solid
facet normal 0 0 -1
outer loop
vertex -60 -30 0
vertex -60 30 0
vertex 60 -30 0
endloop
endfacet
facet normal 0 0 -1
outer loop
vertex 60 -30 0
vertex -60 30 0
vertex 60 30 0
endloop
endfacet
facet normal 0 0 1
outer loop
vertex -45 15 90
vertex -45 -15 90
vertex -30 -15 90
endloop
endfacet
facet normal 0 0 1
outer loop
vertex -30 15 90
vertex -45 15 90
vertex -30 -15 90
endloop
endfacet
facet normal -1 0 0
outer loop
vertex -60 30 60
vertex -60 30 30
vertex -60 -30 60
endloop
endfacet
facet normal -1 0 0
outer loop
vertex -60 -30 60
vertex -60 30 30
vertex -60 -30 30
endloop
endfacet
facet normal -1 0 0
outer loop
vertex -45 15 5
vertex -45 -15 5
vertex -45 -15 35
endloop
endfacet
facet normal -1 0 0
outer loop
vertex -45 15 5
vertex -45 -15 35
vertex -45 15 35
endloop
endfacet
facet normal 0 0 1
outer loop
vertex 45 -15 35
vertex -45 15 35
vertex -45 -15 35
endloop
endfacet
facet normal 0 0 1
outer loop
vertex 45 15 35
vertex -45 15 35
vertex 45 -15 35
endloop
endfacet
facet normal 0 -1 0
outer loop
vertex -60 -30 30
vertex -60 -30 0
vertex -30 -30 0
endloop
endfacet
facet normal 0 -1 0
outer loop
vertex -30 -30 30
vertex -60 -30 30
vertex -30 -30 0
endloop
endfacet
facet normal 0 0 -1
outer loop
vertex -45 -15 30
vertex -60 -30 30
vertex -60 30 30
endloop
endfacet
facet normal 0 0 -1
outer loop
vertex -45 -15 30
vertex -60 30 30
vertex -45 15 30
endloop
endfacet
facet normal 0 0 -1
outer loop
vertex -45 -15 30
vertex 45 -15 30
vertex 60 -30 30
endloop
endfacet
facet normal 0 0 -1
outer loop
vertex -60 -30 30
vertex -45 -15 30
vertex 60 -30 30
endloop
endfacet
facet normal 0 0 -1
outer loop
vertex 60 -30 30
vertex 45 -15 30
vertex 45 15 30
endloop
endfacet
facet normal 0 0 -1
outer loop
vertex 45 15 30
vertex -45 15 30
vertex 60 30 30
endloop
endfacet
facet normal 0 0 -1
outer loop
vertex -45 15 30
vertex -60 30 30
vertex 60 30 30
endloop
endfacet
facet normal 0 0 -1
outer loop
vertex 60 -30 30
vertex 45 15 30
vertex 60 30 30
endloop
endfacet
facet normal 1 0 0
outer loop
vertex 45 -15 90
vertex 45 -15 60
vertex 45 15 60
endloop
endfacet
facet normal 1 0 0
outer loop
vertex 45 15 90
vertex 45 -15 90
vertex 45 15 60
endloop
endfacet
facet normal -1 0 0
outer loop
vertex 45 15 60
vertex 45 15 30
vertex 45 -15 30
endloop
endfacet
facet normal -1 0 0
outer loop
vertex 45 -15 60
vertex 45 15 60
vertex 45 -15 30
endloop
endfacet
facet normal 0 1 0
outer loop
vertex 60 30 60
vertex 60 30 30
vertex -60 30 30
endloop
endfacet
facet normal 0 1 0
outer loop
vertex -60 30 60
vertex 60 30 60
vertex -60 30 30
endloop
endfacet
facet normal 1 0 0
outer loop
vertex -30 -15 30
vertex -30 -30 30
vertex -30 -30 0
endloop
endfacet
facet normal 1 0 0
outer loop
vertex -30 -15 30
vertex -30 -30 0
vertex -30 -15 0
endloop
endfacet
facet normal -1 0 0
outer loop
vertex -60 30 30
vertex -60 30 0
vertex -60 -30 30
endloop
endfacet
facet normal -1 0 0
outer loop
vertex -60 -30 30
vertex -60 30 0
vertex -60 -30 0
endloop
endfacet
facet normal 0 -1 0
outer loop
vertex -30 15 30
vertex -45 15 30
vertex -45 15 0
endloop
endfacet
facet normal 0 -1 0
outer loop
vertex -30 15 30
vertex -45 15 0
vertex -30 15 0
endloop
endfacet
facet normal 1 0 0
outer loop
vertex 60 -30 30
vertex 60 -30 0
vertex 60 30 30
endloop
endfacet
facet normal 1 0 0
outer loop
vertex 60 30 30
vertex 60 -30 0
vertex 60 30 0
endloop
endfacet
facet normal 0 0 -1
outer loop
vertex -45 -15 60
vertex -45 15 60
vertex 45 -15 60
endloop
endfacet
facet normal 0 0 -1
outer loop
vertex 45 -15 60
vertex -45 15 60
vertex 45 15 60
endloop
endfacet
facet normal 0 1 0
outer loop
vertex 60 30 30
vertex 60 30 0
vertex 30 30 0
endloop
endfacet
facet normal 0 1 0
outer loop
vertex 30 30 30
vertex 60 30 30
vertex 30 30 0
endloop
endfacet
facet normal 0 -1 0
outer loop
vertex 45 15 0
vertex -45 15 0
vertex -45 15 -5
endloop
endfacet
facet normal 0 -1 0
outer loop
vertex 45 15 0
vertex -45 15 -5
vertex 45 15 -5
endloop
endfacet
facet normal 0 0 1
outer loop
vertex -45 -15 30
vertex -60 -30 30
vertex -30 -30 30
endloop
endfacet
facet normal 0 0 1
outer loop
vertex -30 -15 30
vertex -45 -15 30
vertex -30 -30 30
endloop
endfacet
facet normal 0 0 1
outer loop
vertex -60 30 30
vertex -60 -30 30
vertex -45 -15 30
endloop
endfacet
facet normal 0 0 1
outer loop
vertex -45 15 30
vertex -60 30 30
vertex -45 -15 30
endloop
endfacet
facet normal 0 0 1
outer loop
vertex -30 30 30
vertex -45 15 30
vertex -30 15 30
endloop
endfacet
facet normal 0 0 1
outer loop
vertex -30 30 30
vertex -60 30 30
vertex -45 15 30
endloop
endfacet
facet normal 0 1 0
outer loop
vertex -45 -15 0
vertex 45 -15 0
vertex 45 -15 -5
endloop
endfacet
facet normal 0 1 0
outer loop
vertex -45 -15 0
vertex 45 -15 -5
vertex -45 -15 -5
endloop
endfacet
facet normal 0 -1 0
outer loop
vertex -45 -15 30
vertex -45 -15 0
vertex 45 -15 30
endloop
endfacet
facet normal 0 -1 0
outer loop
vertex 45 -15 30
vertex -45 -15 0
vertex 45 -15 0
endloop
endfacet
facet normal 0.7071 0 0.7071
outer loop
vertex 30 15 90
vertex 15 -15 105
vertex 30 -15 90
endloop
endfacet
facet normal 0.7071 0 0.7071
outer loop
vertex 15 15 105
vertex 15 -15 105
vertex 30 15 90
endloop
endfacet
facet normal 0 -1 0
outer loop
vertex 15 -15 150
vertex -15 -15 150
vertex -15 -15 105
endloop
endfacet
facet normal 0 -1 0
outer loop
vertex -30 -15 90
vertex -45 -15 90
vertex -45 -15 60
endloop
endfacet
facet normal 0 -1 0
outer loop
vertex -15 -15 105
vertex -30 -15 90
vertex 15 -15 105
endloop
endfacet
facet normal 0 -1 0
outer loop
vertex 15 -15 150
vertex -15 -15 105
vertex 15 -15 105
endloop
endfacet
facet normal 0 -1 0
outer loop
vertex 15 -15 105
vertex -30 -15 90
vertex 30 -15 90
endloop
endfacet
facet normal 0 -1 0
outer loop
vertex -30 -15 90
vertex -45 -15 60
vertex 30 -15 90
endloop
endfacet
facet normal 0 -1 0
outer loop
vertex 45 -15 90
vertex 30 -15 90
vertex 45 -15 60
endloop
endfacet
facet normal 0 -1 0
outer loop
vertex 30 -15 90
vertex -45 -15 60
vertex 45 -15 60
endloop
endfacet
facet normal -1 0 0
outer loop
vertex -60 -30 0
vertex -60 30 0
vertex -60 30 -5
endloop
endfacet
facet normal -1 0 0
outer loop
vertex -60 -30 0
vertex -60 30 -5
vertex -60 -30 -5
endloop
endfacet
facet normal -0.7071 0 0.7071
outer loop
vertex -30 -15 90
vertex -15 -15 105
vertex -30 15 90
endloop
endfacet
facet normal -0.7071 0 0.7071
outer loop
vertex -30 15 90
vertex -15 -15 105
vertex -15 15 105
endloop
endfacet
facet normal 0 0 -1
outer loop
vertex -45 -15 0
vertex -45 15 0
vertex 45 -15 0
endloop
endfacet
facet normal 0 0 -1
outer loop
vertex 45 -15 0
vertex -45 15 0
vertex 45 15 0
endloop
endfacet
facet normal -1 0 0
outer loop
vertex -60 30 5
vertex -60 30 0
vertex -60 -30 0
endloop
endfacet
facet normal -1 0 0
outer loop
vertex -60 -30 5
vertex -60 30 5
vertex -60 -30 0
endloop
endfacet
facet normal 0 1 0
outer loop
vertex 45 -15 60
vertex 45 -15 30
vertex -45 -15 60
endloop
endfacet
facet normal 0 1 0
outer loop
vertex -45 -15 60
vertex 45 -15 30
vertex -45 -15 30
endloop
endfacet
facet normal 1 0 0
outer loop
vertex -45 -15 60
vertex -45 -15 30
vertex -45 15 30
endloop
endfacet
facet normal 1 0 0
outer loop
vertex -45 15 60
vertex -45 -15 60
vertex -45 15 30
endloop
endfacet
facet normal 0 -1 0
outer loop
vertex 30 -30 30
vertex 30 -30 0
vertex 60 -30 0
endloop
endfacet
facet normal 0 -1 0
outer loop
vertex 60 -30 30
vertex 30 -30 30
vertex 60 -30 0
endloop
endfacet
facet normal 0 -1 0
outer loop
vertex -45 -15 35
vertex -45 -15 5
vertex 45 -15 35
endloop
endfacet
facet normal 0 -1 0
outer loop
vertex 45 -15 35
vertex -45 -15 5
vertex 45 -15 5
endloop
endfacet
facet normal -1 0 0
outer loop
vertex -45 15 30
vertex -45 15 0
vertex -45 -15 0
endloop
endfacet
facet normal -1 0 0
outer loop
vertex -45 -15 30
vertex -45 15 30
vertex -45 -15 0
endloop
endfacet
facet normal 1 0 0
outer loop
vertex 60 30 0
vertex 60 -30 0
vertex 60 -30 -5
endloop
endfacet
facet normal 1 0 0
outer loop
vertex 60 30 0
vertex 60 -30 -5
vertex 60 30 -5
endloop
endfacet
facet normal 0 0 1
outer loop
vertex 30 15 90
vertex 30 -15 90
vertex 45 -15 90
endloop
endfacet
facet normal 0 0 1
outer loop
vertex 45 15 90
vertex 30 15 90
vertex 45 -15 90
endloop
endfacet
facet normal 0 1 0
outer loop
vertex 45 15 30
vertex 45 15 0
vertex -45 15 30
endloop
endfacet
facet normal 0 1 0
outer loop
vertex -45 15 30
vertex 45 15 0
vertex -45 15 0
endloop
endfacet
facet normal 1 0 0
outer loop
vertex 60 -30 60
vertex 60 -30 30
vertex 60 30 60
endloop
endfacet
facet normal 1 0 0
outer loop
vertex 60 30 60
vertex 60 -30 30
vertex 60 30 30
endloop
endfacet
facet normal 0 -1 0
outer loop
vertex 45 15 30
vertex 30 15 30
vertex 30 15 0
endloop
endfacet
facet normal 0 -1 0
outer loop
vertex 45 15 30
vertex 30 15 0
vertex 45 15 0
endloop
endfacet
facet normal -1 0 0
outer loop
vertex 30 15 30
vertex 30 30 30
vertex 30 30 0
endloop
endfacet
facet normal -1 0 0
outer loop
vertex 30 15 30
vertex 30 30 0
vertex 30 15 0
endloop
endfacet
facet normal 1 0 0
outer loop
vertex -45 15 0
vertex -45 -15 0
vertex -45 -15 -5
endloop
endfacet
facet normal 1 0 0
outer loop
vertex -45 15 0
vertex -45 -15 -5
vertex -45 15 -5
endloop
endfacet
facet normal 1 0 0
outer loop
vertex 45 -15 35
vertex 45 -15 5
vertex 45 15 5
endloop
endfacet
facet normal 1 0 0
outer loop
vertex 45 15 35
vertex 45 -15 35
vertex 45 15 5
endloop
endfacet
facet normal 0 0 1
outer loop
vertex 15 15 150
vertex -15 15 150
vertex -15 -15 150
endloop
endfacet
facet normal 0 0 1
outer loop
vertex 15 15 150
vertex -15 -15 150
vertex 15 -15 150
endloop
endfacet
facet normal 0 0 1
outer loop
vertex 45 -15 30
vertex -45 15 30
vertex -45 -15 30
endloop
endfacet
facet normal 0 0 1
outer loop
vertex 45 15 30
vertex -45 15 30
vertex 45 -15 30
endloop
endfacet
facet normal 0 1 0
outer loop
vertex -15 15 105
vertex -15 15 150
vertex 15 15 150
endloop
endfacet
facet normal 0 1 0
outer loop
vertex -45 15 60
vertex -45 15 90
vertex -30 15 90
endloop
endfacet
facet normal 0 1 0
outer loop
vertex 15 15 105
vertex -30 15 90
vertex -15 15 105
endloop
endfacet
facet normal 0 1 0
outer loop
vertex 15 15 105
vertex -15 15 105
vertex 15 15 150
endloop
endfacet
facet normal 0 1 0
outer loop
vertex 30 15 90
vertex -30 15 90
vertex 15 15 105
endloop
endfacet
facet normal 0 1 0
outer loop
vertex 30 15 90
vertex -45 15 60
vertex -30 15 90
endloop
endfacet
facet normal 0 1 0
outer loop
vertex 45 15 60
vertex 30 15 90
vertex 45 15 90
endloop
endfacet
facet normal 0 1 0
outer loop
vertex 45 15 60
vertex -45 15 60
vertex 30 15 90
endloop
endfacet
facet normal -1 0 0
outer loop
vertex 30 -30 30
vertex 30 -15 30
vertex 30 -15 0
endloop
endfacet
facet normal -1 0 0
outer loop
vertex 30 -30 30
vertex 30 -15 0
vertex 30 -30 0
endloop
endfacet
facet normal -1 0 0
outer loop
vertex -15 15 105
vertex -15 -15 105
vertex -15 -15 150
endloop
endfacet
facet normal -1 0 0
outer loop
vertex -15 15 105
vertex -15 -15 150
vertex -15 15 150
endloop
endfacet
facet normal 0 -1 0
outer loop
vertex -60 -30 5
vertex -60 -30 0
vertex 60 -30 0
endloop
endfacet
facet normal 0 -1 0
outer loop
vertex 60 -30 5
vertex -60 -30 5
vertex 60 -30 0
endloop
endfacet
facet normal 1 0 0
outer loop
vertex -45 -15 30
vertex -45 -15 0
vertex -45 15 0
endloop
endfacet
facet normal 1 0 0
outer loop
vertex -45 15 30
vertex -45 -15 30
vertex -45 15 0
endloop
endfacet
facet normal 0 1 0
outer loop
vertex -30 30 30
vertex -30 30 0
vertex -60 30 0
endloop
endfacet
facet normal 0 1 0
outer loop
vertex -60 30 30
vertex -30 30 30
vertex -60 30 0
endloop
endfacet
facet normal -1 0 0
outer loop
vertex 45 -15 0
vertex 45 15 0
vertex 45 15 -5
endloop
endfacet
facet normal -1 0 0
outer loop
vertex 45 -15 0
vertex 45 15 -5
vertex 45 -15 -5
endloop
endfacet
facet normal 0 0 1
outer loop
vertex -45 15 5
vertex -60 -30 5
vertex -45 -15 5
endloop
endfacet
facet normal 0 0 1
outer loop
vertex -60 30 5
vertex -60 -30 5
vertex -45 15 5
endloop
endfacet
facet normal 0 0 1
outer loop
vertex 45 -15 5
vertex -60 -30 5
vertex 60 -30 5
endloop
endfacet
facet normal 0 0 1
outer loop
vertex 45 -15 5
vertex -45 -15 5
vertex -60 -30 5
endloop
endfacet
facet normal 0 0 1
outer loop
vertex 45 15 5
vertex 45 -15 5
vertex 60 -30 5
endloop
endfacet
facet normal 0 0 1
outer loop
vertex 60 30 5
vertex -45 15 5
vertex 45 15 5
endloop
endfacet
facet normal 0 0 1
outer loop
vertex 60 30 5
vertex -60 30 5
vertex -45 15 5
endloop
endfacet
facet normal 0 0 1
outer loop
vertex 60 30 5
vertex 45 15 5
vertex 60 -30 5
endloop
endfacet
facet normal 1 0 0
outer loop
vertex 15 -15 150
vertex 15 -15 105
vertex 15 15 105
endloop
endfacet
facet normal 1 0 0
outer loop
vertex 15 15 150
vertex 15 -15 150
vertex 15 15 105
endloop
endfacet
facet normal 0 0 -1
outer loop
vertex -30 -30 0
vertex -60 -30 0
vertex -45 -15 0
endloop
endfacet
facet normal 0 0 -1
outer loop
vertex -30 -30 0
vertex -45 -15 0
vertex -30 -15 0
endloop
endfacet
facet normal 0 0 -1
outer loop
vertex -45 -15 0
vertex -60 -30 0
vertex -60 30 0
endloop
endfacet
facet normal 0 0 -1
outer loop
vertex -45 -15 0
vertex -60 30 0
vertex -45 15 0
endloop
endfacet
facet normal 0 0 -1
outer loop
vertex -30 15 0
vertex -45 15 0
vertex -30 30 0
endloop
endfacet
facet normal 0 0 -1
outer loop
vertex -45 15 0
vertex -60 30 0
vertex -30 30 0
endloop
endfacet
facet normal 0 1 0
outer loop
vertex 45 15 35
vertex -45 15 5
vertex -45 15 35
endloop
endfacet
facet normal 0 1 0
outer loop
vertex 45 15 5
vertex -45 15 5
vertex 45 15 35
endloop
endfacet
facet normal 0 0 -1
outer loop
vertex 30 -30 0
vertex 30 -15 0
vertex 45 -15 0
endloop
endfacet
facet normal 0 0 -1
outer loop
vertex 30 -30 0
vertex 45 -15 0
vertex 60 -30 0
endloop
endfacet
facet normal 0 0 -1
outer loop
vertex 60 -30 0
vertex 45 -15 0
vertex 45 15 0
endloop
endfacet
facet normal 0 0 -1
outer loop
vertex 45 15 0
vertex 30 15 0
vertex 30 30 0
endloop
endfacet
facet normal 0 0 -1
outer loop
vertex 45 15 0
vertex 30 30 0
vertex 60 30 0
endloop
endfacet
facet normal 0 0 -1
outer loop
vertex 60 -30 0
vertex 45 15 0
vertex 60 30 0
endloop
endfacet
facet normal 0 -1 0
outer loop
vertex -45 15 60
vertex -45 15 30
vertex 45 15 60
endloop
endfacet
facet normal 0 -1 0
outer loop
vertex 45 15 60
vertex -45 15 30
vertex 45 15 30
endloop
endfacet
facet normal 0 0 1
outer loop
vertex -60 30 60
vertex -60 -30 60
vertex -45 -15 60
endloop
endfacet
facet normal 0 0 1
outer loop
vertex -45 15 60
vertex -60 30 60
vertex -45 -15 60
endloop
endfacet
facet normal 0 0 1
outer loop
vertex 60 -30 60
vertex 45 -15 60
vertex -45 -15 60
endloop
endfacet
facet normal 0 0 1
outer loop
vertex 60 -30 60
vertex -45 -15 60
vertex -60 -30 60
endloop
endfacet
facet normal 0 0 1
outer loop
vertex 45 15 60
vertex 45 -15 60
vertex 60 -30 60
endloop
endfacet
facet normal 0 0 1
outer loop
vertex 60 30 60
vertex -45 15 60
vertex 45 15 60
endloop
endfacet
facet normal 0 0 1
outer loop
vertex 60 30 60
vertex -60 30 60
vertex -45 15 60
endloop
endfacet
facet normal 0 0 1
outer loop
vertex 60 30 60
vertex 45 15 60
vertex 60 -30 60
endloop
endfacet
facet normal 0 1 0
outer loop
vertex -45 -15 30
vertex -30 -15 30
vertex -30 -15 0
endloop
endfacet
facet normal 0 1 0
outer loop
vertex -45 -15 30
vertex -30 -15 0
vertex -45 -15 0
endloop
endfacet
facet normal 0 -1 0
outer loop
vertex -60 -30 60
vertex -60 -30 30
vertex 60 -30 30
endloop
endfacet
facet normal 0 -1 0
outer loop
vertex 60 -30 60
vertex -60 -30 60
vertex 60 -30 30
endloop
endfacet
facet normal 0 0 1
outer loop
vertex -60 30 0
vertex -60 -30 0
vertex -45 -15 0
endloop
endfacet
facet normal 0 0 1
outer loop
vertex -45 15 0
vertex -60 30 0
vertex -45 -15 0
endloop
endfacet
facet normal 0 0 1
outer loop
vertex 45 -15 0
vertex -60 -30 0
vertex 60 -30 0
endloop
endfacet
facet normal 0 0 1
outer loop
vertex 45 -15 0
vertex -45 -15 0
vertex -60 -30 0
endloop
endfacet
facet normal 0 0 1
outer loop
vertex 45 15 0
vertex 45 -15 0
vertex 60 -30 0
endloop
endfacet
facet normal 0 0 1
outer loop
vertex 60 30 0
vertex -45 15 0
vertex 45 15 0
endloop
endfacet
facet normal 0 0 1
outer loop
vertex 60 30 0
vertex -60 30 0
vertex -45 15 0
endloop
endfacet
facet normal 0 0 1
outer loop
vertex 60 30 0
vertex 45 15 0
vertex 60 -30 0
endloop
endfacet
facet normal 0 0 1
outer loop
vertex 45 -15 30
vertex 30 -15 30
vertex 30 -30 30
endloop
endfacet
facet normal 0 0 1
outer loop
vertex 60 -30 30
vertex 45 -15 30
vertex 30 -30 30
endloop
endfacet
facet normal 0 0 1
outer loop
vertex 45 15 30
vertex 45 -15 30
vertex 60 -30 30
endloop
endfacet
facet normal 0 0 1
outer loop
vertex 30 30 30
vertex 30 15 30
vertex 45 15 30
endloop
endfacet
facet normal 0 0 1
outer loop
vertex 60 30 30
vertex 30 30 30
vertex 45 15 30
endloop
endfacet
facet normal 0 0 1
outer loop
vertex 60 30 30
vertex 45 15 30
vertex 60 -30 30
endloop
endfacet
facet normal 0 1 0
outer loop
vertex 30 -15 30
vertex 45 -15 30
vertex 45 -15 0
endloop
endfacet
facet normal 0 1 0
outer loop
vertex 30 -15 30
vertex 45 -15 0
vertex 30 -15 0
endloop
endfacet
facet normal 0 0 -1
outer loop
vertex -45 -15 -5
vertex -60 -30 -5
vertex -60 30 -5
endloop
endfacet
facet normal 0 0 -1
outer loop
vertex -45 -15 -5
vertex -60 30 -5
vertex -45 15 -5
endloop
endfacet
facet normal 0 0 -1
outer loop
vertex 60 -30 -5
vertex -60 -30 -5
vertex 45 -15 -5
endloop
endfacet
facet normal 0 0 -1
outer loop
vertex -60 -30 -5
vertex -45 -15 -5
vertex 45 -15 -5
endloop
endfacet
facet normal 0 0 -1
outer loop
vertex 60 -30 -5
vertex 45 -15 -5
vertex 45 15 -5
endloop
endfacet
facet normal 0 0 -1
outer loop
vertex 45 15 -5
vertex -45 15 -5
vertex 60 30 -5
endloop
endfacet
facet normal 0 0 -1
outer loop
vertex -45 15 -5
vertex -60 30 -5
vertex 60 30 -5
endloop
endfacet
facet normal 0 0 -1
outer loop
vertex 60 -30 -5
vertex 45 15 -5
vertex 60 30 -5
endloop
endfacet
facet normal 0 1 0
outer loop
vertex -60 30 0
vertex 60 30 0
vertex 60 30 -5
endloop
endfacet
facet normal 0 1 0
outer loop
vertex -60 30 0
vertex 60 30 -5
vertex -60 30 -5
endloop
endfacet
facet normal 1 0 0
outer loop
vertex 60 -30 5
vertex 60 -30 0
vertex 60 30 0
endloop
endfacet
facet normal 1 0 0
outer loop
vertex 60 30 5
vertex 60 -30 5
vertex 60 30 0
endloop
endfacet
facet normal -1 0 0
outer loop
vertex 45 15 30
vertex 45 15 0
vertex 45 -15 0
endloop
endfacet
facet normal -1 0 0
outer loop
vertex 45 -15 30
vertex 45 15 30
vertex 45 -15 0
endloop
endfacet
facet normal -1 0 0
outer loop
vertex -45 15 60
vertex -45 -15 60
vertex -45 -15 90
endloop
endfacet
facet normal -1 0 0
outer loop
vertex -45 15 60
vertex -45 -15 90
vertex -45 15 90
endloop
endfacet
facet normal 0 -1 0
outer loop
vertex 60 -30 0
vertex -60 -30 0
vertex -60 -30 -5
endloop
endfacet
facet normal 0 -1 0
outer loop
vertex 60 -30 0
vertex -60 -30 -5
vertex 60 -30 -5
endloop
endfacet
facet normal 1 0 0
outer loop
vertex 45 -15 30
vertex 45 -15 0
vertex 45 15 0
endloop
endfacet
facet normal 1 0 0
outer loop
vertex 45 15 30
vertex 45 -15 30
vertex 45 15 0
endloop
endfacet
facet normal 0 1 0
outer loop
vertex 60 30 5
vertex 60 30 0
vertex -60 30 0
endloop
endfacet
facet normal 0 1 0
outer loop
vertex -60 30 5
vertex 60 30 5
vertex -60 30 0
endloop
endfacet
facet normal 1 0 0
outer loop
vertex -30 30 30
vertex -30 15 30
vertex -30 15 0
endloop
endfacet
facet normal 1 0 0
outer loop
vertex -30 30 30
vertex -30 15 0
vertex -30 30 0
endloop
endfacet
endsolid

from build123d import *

# Parameters (mm, degrees)
F1_DEPTH  = 30
F0_W      = 60
F0_H      = 15
F2_DEPTH  = 5
F3_DEPTH  = 30
F5_DEPTH  = 30
F6_W      = 90
F6_H      = 30
F7_DEPTH  = 30
F8_W      = 30
F8_H      = 30
F9_DEPTH  = 60
F10_SIZE  = 15
F11_DEPTH = 5
F12_W     = 90
F12_H     = 30
F13_DEPTH = 30


with BuildPart() as f1:
    # F0 (on Top) → F1 (new body)
    with BuildSketch(Plane.XY):
        Polygon((45, -15), (45, 15), (30, 15), (-30, 15), (-45, 15), (-45, -15), (-30, -15), (30, -15), align=None)
    extrude(amount=F1_DEPTH)


with BuildPart() as f2:
    # F0 (on Top) → F2 (new body)
    with BuildSketch(Plane.XY):
        Polygon((-45, 15), (-30, 15), (-30, 30), (-60, 30), (-60, -30), (-30, -30), (-30, -15), (-45, -15), align=None)
        with Locations((0, -22.5)):
            Rectangle(F0_W, F0_H)
        Polygon((30, 15), (45, 15), (45, -15), (30, -15), (30, -30), (60, -30), (60, 30), (30, 30), align=None)
        with Locations((0, 22.5)):
            Rectangle(F0_W, F0_H)
    extrude(amount=-F2_DEPTH)


with BuildPart() as f3:
    # F0 (on Top) → F3 (new body)
    with BuildSketch(Plane.XY):
        Polygon((30, 15), (45, 15), (45, -15), (30, -15), (30, -30), (60, -30), (60, 30), (30, 30), align=None)
    extrude(amount=F3_DEPTH)


with BuildPart() as f3b:
    # F0 (on Top) → F3, piece 2 (new body)
    with BuildSketch(Plane.XY):
        Polygon((-45, 15), (-30, 15), (-30, 30), (-60, 30), (-60, -30), (-30, -30), (-30, -15), (-45, -15), align=None)
    extrude(amount=F3_DEPTH)


with BuildPart() as f5:
    # F4 (on face) → F5 (new body)
    with BuildSketch(Plane.XY.offset(30)):
        Polygon((-30, 30), (-60, 30), (-60, -30), (-30, -30), (-30, -15), (-45, -15), (-45, 15), (-30, 15), align=None)
        Polygon((60, 30), (-30, 30), (-30, 15), (45, 15), (45, -15), (-30, -15), (-30, -30), (60, -30), align=None)
    extrude(amount=F5_DEPTH)


with BuildPart() as f7:
    # F6 (on face) → F7 (new body)
    with BuildSketch(Plane.XY.offset(60)):
        Rectangle(F6_W, F6_H)
    extrude(amount=F7_DEPTH)

    # F8 (on face) → F9 (join)
    with BuildSketch(Plane.XY.offset(90)):
        Rectangle(F8_W, F8_H)
    extrude(amount=F9_DEPTH)

    # F10
    f10_edges = [f7.edges().sort_by_distance(p)[0] for p in [
        (15, 0, 90),
        (-15, 0, 90),
    ]]
    chamfer(f10_edges, length=F10_SIZE)


with BuildPart() as f11:
    # F0 (on Top) → F11 (new body)
    with BuildSketch(Plane.XY):
        Polygon((-45, 15), (-30, 15), (-30, 30), (-60, 30), (-60, -30), (-30, -30), (-30, -15), (-45, -15), align=None)
        with Locations((0, 22.5)):
            Rectangle(F0_W, F0_H)
        Polygon((30, 15), (45, 15), (45, -15), (30, -15), (30, -30), (60, -30), (60, 30), (30, 30), align=None)
        with Locations((0, -22.5)):
            Rectangle(F0_W, F0_H)
        Polygon((45, -15), (45, 15), (30, 15), (-30, 15), (-45, 15), (-45, -15), (-30, -15), (30, -15), align=None)
    extrude(amount=F11_DEPTH)

    # F12 (on face) → F13 (join)
    with BuildSketch(Plane.XY.offset(5)):
        Rectangle(F12_W, F12_H)
    extrude(amount=F13_DEPTH)


solid = Compound([f1.part, f2.part, f3.part, f3b.part, f5.part, f7.part, f11.part])
